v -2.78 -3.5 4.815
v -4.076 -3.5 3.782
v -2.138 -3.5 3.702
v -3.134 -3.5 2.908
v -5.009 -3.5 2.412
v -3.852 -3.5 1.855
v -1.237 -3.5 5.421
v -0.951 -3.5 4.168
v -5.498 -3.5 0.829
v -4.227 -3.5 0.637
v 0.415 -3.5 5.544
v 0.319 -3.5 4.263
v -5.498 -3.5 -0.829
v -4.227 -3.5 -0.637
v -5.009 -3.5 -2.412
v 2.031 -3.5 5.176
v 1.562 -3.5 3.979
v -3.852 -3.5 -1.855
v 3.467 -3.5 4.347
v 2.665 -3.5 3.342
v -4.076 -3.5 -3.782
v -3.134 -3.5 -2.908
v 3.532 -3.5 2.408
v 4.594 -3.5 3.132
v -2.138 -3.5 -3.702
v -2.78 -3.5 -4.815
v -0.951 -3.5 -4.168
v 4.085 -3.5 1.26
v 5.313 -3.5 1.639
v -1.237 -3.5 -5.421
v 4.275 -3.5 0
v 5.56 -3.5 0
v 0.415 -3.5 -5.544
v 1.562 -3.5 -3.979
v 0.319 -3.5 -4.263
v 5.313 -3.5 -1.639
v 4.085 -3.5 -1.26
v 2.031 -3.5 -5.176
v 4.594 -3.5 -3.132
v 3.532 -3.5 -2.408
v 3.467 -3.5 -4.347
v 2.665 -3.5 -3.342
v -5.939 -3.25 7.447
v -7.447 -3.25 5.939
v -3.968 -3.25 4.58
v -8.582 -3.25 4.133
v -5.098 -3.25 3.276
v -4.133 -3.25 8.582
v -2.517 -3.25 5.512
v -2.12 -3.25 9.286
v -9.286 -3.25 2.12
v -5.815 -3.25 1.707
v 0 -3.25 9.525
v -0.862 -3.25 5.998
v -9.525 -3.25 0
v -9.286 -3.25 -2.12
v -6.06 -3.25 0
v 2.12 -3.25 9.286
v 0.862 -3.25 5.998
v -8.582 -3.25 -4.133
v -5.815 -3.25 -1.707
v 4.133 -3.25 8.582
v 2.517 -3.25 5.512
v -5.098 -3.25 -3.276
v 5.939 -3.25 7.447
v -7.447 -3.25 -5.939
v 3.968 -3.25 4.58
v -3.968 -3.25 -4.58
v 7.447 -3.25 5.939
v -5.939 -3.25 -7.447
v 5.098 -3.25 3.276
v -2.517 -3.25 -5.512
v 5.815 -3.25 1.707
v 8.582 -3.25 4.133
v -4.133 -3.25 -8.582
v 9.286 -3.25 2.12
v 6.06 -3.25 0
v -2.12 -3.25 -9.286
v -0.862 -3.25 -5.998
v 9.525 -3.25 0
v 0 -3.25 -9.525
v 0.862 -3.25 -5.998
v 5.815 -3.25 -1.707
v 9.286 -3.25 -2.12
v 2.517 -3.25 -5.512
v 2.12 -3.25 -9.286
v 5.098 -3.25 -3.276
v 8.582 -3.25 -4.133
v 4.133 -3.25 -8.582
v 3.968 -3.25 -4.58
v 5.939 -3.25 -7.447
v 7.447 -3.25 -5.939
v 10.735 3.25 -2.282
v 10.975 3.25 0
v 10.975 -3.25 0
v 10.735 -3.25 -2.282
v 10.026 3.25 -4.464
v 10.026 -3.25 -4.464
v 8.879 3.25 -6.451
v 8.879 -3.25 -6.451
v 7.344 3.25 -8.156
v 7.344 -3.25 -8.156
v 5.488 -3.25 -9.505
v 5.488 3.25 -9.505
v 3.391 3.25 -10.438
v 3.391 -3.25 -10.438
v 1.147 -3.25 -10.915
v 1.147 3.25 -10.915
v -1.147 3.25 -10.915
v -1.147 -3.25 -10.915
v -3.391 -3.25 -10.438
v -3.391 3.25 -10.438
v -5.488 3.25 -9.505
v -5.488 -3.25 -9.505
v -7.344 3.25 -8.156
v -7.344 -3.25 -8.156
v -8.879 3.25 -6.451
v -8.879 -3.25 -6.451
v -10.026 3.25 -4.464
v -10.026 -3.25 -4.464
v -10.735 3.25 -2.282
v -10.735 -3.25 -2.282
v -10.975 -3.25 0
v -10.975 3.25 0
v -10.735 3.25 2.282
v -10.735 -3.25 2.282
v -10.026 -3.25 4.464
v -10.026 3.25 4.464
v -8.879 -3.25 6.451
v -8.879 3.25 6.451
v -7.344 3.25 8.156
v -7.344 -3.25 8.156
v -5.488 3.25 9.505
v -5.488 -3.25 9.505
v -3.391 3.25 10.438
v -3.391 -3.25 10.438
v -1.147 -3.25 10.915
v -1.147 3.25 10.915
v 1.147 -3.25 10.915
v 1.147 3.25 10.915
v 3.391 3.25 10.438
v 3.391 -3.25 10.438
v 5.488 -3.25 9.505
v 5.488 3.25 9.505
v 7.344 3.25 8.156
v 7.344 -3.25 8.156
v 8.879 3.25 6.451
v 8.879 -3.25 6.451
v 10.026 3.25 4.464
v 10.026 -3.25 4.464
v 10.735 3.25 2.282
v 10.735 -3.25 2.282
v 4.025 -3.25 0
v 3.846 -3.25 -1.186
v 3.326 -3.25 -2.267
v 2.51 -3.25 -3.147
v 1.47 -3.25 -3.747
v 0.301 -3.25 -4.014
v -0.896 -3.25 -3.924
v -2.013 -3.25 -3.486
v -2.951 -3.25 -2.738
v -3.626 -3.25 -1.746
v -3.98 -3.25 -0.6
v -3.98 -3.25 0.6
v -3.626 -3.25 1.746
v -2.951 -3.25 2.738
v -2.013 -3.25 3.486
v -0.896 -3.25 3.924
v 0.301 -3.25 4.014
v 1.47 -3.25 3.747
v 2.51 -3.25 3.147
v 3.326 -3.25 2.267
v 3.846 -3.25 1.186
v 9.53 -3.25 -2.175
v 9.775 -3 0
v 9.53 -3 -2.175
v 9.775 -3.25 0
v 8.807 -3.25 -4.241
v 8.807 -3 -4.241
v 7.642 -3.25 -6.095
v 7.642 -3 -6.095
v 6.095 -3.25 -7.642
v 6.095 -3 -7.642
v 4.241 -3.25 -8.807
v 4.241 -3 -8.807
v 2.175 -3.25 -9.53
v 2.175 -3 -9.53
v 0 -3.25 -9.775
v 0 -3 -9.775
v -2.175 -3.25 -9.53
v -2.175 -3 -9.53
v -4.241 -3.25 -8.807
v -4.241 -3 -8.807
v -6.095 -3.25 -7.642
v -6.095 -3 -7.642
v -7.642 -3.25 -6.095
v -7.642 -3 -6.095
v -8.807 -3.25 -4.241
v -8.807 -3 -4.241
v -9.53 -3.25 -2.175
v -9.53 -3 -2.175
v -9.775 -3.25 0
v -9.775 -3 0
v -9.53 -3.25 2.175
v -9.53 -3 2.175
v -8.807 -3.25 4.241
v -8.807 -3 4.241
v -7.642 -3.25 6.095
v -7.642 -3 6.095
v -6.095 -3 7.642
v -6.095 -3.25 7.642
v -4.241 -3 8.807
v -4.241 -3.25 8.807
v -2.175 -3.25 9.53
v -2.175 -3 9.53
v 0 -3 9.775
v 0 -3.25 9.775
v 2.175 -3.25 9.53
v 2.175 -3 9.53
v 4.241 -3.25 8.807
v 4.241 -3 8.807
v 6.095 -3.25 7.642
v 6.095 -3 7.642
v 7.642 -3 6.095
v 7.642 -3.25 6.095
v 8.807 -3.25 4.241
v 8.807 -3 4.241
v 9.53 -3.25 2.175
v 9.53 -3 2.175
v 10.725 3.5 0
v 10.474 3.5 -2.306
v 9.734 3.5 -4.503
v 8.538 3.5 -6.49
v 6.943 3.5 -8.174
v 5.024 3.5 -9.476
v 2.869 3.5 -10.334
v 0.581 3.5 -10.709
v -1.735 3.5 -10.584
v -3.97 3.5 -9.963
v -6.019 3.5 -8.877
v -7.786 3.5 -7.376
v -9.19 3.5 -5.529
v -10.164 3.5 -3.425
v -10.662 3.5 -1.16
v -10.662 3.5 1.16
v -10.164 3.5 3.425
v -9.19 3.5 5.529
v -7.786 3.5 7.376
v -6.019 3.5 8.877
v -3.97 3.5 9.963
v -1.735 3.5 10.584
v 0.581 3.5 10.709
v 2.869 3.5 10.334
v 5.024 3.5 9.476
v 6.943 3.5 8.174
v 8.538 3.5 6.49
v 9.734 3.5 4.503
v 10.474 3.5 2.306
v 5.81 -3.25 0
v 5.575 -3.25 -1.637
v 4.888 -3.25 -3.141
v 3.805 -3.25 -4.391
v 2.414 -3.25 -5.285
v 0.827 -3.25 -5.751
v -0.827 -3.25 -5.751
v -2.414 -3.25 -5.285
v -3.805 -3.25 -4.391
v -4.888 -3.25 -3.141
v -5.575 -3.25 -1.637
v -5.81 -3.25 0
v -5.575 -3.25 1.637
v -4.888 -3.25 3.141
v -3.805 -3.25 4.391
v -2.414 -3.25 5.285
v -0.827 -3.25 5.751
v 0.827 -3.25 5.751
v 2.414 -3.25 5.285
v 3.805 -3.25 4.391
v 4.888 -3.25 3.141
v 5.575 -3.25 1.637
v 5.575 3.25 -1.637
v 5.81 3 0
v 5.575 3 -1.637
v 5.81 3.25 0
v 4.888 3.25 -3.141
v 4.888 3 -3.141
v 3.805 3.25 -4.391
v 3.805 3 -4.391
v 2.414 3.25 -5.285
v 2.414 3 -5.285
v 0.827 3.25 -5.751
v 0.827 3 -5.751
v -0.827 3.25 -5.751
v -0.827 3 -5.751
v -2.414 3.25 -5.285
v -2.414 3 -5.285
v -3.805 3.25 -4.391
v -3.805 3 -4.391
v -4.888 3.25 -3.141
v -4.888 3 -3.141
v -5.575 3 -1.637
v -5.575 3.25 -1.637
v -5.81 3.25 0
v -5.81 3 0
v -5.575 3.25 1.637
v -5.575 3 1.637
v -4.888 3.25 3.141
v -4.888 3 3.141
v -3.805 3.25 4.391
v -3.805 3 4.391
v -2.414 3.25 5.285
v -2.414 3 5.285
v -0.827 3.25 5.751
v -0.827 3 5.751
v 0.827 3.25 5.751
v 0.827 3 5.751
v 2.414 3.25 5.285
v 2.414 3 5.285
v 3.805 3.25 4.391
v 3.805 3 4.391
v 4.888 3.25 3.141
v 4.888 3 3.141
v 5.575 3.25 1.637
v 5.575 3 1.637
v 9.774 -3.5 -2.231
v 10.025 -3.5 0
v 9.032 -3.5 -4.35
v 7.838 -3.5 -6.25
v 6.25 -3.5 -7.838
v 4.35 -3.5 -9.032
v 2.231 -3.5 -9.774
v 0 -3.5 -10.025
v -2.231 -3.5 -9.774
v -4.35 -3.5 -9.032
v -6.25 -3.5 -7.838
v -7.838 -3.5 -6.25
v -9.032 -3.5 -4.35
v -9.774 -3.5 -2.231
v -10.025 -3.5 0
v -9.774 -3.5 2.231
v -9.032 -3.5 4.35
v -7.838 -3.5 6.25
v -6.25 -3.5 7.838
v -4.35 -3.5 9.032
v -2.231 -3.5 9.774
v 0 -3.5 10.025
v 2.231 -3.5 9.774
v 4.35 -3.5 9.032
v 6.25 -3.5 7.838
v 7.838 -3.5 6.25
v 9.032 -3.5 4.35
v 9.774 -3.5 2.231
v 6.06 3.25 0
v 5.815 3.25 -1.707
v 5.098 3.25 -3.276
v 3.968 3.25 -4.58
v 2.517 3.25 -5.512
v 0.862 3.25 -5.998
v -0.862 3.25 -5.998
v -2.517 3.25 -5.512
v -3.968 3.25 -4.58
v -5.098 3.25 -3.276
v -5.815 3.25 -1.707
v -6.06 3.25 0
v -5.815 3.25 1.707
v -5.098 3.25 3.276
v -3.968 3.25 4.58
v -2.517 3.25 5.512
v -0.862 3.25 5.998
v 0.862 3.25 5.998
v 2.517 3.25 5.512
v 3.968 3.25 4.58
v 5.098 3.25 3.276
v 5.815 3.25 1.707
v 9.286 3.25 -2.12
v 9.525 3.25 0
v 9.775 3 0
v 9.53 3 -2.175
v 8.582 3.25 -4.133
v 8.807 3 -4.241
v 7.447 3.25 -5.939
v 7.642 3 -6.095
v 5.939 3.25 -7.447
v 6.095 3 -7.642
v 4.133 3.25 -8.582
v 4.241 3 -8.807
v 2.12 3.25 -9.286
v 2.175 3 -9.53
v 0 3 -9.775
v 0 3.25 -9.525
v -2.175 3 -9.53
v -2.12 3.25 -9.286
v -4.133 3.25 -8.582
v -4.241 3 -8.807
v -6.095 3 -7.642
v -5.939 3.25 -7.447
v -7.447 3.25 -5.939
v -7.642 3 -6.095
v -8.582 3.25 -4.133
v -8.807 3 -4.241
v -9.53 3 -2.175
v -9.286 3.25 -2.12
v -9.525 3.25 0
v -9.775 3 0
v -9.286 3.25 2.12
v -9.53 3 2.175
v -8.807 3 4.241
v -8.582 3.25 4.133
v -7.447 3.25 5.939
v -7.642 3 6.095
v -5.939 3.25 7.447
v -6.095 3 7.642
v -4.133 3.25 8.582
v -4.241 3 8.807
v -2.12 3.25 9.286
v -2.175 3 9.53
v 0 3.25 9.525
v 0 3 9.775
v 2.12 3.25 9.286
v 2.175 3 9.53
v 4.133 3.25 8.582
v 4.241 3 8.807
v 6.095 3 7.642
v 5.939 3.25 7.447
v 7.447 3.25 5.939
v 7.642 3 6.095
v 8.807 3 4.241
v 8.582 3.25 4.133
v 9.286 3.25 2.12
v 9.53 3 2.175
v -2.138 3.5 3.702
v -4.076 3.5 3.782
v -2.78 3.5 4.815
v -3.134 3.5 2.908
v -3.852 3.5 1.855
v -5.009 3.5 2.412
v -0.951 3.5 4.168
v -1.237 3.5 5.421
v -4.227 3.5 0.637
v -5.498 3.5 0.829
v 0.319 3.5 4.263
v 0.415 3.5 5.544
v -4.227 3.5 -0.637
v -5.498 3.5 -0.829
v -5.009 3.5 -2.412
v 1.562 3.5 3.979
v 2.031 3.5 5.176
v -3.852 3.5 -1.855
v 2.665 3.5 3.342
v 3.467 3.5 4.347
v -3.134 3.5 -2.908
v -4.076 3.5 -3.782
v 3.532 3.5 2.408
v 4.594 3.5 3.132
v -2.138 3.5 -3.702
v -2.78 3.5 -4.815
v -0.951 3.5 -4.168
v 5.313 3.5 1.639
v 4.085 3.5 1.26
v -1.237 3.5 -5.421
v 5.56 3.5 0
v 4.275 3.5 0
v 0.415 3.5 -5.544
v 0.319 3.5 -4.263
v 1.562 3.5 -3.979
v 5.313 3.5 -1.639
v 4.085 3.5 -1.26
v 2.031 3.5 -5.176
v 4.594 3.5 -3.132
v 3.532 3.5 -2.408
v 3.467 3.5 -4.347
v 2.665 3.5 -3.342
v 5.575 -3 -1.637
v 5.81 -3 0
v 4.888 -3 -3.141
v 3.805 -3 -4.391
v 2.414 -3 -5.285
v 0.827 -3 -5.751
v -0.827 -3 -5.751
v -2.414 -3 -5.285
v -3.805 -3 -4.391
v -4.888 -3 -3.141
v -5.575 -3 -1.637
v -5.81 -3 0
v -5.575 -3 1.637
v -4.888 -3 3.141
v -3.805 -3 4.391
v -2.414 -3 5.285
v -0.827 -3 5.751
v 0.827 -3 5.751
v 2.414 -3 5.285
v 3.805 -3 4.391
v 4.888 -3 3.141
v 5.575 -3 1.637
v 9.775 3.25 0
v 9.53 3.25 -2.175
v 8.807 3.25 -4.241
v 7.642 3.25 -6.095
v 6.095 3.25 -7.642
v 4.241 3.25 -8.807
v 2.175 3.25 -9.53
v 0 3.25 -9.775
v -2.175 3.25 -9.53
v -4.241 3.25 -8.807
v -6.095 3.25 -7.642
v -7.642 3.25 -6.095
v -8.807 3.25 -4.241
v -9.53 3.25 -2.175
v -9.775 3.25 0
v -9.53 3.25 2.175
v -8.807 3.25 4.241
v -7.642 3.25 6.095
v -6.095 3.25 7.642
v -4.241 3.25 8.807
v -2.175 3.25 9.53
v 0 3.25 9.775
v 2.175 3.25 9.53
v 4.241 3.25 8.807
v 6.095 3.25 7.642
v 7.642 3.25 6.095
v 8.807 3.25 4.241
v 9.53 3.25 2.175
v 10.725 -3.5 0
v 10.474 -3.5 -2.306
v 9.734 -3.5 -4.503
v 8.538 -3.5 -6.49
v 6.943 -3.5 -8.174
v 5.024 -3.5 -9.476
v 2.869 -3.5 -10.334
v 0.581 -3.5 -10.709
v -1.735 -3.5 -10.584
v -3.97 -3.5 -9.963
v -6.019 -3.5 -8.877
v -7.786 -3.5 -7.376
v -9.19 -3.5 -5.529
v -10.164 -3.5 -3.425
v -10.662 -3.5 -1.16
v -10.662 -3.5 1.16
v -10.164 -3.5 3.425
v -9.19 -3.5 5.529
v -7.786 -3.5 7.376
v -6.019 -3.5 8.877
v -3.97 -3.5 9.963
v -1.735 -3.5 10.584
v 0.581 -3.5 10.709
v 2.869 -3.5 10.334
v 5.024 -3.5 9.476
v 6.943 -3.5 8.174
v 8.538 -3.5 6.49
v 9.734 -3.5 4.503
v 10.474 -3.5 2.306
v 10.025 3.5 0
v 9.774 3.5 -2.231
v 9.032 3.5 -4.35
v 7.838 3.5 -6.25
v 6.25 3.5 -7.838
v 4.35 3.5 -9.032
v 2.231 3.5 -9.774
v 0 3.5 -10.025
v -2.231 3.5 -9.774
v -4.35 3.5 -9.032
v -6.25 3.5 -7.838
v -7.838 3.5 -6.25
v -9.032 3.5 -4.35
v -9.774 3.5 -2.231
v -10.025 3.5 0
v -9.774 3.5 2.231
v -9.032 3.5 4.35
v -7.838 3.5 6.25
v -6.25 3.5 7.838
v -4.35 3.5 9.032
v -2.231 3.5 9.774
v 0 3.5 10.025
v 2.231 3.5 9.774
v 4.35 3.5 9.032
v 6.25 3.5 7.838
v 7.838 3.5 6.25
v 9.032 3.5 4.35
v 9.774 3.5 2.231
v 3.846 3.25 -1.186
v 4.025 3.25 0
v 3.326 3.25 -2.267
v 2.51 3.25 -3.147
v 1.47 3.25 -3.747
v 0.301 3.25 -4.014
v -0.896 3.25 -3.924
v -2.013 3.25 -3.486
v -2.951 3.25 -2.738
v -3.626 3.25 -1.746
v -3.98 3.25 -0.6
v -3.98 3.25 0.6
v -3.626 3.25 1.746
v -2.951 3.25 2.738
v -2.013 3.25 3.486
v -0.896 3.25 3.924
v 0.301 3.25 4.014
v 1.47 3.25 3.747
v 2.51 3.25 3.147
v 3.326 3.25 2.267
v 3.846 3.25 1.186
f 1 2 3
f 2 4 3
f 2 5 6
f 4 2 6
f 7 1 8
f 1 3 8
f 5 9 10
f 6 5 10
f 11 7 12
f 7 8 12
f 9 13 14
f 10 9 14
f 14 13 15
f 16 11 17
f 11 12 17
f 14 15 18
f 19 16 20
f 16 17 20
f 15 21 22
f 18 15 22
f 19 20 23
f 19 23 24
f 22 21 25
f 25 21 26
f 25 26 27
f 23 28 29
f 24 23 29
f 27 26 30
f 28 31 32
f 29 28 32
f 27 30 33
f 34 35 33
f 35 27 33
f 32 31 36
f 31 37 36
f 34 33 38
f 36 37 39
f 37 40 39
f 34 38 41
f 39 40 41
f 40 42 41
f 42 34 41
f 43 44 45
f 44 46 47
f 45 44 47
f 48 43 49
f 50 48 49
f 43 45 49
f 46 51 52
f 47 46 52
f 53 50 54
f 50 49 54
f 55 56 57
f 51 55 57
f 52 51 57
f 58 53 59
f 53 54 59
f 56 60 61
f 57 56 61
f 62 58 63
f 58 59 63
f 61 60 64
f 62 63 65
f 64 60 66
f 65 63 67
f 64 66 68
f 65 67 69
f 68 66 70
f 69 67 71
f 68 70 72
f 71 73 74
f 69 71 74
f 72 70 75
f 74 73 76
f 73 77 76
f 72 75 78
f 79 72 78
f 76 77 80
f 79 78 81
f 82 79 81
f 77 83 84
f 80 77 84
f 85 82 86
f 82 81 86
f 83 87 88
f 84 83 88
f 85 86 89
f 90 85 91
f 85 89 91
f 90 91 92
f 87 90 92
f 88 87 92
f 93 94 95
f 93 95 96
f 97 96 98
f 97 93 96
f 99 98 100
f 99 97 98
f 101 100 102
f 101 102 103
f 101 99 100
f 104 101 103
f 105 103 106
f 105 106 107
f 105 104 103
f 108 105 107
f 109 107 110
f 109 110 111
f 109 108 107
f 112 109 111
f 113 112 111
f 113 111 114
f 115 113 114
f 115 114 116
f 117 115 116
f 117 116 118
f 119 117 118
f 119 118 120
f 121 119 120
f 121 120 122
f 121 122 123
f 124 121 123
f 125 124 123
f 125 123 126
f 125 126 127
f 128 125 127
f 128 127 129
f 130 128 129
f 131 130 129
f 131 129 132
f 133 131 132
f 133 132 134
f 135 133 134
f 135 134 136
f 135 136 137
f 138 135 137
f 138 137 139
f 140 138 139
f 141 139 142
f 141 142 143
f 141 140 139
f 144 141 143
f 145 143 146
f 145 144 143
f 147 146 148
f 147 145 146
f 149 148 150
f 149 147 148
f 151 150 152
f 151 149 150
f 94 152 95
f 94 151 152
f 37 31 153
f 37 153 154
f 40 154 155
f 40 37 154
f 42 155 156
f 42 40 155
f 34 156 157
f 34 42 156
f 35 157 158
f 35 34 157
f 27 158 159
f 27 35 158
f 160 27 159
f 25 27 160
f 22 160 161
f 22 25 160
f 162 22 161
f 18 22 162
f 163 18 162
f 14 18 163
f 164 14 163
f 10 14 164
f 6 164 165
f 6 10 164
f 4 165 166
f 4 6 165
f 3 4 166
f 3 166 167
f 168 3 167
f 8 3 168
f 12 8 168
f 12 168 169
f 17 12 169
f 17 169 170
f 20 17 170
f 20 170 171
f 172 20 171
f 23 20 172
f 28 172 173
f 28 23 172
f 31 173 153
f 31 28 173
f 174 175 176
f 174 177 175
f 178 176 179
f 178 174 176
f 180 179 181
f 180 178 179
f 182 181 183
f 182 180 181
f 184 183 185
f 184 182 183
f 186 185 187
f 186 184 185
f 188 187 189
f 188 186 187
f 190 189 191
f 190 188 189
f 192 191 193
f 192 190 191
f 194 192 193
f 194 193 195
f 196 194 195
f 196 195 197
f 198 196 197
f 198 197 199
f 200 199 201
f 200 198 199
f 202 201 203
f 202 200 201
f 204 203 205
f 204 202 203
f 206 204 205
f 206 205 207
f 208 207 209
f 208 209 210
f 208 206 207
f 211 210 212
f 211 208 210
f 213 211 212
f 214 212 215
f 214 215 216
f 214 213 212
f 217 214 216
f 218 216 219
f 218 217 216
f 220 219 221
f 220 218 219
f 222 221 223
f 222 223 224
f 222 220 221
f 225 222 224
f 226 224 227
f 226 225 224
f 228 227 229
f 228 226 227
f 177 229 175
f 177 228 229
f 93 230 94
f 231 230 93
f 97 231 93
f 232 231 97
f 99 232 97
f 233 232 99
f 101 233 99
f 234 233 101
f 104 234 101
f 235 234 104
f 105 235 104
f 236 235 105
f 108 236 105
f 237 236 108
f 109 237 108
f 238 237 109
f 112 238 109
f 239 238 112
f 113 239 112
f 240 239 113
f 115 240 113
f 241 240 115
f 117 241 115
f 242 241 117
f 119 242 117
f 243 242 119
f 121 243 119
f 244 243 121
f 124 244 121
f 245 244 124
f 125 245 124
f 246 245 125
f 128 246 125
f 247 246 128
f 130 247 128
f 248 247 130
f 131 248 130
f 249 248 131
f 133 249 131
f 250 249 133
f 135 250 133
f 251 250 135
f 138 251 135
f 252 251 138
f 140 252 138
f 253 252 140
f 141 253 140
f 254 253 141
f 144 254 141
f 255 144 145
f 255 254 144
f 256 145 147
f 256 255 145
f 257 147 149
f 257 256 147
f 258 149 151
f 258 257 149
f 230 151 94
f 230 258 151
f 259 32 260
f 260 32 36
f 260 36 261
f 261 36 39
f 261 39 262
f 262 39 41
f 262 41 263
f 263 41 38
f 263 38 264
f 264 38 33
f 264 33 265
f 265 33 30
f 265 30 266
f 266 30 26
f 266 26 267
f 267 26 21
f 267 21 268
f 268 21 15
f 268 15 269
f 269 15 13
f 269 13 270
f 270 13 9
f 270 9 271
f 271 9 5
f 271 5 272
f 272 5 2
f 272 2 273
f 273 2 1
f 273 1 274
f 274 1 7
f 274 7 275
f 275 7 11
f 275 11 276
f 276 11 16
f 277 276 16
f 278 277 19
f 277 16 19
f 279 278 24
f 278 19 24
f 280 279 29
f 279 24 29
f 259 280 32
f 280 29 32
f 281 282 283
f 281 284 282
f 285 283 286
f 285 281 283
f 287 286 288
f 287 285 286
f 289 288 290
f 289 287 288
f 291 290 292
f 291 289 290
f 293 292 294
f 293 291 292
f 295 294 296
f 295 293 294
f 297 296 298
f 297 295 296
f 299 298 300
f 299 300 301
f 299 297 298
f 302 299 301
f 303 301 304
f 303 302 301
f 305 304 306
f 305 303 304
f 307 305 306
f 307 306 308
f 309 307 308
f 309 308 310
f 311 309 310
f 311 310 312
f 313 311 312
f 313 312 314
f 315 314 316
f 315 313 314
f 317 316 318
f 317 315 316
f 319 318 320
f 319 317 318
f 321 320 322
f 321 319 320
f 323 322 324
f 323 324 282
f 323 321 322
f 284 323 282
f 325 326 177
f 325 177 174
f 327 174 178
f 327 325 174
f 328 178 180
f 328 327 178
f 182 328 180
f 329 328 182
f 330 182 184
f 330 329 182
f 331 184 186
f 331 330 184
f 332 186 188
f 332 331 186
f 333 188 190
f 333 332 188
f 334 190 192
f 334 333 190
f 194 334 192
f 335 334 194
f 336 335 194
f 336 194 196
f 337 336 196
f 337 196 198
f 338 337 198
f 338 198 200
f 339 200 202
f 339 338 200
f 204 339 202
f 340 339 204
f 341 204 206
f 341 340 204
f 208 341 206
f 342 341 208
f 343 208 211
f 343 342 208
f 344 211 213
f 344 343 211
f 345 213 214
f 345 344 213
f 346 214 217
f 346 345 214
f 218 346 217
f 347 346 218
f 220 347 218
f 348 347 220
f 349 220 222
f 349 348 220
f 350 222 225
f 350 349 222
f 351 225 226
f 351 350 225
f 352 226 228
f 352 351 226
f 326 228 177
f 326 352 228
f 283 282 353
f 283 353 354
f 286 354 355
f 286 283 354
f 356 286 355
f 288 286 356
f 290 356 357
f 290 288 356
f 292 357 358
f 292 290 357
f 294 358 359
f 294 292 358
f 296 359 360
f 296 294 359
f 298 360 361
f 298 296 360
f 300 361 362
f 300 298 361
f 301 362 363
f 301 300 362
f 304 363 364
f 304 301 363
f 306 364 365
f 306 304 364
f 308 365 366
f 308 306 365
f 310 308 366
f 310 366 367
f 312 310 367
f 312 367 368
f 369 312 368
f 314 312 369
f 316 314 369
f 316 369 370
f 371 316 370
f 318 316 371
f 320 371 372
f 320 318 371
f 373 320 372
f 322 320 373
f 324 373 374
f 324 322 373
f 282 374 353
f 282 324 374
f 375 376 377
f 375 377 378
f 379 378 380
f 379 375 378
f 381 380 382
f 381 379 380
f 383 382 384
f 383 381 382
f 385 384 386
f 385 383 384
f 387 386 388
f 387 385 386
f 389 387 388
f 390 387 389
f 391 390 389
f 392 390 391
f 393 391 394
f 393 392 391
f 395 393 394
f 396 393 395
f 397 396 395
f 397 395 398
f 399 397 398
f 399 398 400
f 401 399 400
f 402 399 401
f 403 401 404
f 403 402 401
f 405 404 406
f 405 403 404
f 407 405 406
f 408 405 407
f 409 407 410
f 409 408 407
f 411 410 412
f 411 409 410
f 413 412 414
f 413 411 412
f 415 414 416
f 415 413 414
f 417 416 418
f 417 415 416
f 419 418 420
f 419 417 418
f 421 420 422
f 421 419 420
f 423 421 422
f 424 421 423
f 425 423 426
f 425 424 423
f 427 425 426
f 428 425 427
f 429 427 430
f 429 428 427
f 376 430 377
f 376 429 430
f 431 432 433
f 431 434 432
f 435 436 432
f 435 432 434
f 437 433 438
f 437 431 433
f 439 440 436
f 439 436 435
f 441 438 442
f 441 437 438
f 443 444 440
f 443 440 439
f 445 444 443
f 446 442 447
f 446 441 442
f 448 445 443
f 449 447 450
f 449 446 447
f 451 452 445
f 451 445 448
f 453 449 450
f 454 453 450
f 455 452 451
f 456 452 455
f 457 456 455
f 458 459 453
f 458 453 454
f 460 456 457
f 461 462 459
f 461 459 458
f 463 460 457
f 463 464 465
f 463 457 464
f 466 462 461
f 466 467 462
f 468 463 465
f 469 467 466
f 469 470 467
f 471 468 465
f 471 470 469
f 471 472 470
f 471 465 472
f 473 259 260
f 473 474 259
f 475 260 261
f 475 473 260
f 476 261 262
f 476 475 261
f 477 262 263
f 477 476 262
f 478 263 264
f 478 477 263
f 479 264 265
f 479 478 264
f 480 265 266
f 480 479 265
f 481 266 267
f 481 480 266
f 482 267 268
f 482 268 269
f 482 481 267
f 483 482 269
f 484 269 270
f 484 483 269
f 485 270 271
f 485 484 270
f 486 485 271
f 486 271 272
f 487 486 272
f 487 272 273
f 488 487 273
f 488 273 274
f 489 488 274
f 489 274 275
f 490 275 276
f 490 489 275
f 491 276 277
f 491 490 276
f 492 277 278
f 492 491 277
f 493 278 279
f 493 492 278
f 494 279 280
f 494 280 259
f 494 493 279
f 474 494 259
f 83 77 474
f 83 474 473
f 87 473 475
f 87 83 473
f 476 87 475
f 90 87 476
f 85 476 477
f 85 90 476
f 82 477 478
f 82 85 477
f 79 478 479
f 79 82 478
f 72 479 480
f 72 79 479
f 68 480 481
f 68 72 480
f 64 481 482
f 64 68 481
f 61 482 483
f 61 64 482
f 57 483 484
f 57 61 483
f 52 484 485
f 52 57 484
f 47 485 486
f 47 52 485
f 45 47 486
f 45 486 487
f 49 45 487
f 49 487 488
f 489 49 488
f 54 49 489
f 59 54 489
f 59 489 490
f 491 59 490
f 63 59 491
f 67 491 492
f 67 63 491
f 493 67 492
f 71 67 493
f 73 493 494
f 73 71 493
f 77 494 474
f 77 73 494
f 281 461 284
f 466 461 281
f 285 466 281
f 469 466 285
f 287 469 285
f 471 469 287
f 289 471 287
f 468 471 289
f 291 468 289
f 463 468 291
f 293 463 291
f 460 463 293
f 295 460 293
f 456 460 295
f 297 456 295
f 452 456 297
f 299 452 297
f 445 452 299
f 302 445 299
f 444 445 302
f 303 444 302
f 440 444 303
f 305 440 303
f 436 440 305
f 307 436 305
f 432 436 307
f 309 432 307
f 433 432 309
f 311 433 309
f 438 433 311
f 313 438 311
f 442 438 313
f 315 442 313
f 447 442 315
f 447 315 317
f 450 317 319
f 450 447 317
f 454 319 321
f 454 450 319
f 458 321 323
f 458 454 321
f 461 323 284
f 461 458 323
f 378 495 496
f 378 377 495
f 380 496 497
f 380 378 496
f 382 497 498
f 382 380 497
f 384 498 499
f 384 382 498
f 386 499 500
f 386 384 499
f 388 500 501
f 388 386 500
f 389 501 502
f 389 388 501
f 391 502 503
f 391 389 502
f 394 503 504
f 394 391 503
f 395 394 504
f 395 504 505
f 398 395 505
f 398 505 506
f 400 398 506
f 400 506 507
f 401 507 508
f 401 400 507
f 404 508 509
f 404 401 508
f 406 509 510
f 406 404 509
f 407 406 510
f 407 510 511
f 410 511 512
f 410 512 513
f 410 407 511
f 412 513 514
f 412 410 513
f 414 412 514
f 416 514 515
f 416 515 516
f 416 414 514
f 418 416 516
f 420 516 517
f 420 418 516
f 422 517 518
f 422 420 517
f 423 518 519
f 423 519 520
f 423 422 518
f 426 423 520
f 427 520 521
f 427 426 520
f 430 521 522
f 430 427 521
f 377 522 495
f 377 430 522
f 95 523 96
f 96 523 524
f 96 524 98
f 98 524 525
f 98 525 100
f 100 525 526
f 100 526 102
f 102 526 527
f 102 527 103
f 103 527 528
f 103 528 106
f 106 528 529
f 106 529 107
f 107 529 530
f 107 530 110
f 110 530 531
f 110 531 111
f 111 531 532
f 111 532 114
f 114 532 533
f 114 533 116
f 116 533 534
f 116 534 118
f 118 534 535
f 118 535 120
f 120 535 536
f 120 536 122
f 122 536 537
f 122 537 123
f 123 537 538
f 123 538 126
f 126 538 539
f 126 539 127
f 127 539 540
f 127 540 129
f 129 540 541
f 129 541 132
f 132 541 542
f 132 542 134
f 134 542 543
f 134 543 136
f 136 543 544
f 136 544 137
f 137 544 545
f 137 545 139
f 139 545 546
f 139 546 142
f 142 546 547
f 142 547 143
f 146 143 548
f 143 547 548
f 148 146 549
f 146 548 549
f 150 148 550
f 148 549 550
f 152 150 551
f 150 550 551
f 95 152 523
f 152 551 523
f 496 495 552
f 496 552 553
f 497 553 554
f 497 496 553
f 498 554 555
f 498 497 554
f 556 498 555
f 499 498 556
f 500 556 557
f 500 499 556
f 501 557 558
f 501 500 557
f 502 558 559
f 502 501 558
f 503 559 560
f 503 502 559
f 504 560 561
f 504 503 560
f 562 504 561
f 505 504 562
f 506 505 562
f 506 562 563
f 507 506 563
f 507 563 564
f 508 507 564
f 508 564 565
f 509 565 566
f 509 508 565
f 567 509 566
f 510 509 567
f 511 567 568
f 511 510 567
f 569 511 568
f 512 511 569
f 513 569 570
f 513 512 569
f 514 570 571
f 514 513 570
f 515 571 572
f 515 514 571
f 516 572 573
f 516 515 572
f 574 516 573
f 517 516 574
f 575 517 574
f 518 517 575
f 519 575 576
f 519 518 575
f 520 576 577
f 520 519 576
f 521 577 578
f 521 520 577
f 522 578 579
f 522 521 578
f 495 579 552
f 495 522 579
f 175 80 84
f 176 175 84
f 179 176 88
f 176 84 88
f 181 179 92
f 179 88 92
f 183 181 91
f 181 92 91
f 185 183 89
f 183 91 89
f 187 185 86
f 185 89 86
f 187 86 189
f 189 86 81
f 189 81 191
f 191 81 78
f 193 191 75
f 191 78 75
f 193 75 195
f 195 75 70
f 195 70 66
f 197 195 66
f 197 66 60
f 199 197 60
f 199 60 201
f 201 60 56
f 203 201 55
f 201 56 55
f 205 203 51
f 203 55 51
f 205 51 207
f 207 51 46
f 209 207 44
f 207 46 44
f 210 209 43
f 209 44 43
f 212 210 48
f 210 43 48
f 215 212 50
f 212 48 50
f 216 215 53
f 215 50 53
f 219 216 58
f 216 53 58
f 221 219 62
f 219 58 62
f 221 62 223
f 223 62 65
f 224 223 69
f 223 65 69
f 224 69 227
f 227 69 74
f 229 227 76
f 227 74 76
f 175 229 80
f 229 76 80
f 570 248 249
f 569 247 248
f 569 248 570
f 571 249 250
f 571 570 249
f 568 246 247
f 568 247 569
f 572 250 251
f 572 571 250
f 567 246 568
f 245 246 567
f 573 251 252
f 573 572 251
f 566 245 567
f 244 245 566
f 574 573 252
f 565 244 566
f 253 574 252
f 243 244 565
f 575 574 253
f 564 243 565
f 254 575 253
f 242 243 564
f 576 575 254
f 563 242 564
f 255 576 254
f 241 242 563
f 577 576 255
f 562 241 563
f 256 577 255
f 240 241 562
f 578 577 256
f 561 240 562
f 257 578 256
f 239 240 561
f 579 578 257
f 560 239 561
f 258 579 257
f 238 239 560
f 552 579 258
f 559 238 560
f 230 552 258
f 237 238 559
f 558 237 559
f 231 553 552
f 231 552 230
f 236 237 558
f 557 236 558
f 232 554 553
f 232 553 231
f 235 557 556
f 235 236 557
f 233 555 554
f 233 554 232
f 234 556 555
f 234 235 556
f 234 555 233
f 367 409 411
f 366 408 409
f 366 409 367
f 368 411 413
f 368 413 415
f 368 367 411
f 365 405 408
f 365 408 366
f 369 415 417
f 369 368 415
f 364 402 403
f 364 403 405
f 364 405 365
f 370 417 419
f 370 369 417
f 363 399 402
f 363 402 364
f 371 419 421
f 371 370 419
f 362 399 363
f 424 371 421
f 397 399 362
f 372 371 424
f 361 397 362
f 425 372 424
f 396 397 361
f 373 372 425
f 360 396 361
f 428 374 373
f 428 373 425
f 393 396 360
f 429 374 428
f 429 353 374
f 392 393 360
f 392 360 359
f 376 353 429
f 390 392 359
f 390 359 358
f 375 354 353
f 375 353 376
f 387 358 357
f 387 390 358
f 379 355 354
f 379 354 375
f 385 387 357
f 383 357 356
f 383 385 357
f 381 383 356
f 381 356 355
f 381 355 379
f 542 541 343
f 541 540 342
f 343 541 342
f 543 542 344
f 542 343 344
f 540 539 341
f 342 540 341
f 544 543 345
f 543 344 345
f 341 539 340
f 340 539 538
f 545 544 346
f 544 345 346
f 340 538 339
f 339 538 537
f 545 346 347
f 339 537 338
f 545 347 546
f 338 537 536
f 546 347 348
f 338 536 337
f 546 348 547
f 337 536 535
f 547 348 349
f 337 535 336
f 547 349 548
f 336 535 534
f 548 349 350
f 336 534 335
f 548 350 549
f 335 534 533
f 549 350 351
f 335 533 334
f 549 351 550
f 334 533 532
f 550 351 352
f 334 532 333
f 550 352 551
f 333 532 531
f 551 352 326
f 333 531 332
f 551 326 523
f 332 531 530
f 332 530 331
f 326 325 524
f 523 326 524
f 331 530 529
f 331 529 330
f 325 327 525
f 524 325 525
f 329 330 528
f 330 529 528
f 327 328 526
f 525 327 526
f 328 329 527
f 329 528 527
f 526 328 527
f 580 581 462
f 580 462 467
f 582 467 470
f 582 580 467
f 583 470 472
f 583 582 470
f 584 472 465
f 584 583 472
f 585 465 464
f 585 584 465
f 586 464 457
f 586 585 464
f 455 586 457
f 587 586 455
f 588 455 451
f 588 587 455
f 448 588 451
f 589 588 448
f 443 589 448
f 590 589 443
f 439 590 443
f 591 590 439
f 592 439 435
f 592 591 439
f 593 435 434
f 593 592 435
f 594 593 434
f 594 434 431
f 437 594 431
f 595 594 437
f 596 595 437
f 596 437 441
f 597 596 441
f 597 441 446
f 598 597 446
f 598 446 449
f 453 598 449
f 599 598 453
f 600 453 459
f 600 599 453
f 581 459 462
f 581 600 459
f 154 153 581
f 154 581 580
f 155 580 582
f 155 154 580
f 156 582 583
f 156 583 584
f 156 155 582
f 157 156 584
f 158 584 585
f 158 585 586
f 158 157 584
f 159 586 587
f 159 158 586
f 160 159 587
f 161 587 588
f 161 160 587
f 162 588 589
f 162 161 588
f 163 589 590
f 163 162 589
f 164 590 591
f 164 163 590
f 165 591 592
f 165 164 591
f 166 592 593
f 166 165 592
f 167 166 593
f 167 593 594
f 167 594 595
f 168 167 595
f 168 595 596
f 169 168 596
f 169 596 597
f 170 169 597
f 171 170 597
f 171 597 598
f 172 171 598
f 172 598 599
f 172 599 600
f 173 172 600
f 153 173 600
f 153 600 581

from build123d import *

# Parameters (mm, degrees)
SKETCH1_R             = 10.975
SKETCH1_R_2           = 9.775
BOSS_EXTRUDE1_DEPTH   = 3.5
SKETCH1_R_3           = 5.81
SKETCH1_R_4           = 4.025
BOSS_EXTRUDE1_2_DEPTH = 3.5
SKETCH1_3_R           = 9.775
SKETCH1_3_R_2         = 5.81
BOSS_EXTRUDE2_DEPTH   = 3.25
CHAMFER1_SIZE         = 0.25
CHAMFER2_SIZE         = 0.25
CHAMFER3_SIZE         = 0.25


with BuildPart() as part:
    # Sketch1 → Boss-Extrude1 (new body, symmetric)
    with BuildSketch(Plane(origin=(0, 0, 0), x_dir=(1, 0, 0), z_dir=(0, 1, 0))):
        Circle(SKETCH1_R)
        Circle(SKETCH1_R_2, mode=Mode.SUBTRACT)
    extrude(amount=BOSS_EXTRUDE1_DEPTH, both=True)

    # Chamfer2
    chamfer2_edges = [part.edges().sort_by_distance(p)[0] for p in [
        (-10.975, 3.5, 0),
        (-10.975, -3.5, 0),
        (-9.775, -3.5, 0),
        (-9.775, 3.5, 0),
    ]]
    chamfer(chamfer2_edges, length=CHAMFER2_SIZE)


with BuildPart() as body_2:
    # Sketch1 → Boss-Extrude1 2 (new body, symmetric)
    with BuildSketch(Plane(origin=(0, 0, 0), x_dir=(1, 0, 0), z_dir=(0, 1, 0))):
        Circle(SKETCH1_R_3)
        Circle(SKETCH1_R_4, mode=Mode.SUBTRACT)
    extrude(amount=BOSS_EXTRUDE1_2_DEPTH, both=True)

    # Chamfer3
    chamfer3_edges = [body_2.edges().sort_by_distance(p)[0] for p in [
        (-5.81, 3.5, 0),
        (-5.81, -3.5, 0),
        (-4.025, -3.5, 0),
        (-4.025, 3.5, 0),
    ]]
    chamfer(chamfer3_edges, length=CHAMFER3_SIZE)


with BuildPart() as body_3:
    # Sketch1<3> → Boss-Extrude2 (new body, symmetric)
    with BuildSketch(Plane(origin=(0, 0, 0), x_dir=(1, 0, 0), z_dir=(0, 1, 0))):
        Circle(SKETCH1_3_R)
        Circle(SKETCH1_3_R_2, mode=Mode.SUBTRACT)
    extrude(amount=BOSS_EXTRUDE2_DEPTH, both=True)

    # Chamfer1
    chamfer1_edges = [body_3.edges().sort_by_distance(p)[0] for p in [
        (-9.775, 3.25, 0),
        (-9.775, -3.25, 0),
        (-5.81, -3.25, 0),
        (-5.81, 3.25, 0),
    ]]
    chamfer(chamfer1_edges, length=CHAMFER1_SIZE)

    # Combine1: union body 2, part
    add(body_2.part)
    add(part.part)


solid = body_3.part
